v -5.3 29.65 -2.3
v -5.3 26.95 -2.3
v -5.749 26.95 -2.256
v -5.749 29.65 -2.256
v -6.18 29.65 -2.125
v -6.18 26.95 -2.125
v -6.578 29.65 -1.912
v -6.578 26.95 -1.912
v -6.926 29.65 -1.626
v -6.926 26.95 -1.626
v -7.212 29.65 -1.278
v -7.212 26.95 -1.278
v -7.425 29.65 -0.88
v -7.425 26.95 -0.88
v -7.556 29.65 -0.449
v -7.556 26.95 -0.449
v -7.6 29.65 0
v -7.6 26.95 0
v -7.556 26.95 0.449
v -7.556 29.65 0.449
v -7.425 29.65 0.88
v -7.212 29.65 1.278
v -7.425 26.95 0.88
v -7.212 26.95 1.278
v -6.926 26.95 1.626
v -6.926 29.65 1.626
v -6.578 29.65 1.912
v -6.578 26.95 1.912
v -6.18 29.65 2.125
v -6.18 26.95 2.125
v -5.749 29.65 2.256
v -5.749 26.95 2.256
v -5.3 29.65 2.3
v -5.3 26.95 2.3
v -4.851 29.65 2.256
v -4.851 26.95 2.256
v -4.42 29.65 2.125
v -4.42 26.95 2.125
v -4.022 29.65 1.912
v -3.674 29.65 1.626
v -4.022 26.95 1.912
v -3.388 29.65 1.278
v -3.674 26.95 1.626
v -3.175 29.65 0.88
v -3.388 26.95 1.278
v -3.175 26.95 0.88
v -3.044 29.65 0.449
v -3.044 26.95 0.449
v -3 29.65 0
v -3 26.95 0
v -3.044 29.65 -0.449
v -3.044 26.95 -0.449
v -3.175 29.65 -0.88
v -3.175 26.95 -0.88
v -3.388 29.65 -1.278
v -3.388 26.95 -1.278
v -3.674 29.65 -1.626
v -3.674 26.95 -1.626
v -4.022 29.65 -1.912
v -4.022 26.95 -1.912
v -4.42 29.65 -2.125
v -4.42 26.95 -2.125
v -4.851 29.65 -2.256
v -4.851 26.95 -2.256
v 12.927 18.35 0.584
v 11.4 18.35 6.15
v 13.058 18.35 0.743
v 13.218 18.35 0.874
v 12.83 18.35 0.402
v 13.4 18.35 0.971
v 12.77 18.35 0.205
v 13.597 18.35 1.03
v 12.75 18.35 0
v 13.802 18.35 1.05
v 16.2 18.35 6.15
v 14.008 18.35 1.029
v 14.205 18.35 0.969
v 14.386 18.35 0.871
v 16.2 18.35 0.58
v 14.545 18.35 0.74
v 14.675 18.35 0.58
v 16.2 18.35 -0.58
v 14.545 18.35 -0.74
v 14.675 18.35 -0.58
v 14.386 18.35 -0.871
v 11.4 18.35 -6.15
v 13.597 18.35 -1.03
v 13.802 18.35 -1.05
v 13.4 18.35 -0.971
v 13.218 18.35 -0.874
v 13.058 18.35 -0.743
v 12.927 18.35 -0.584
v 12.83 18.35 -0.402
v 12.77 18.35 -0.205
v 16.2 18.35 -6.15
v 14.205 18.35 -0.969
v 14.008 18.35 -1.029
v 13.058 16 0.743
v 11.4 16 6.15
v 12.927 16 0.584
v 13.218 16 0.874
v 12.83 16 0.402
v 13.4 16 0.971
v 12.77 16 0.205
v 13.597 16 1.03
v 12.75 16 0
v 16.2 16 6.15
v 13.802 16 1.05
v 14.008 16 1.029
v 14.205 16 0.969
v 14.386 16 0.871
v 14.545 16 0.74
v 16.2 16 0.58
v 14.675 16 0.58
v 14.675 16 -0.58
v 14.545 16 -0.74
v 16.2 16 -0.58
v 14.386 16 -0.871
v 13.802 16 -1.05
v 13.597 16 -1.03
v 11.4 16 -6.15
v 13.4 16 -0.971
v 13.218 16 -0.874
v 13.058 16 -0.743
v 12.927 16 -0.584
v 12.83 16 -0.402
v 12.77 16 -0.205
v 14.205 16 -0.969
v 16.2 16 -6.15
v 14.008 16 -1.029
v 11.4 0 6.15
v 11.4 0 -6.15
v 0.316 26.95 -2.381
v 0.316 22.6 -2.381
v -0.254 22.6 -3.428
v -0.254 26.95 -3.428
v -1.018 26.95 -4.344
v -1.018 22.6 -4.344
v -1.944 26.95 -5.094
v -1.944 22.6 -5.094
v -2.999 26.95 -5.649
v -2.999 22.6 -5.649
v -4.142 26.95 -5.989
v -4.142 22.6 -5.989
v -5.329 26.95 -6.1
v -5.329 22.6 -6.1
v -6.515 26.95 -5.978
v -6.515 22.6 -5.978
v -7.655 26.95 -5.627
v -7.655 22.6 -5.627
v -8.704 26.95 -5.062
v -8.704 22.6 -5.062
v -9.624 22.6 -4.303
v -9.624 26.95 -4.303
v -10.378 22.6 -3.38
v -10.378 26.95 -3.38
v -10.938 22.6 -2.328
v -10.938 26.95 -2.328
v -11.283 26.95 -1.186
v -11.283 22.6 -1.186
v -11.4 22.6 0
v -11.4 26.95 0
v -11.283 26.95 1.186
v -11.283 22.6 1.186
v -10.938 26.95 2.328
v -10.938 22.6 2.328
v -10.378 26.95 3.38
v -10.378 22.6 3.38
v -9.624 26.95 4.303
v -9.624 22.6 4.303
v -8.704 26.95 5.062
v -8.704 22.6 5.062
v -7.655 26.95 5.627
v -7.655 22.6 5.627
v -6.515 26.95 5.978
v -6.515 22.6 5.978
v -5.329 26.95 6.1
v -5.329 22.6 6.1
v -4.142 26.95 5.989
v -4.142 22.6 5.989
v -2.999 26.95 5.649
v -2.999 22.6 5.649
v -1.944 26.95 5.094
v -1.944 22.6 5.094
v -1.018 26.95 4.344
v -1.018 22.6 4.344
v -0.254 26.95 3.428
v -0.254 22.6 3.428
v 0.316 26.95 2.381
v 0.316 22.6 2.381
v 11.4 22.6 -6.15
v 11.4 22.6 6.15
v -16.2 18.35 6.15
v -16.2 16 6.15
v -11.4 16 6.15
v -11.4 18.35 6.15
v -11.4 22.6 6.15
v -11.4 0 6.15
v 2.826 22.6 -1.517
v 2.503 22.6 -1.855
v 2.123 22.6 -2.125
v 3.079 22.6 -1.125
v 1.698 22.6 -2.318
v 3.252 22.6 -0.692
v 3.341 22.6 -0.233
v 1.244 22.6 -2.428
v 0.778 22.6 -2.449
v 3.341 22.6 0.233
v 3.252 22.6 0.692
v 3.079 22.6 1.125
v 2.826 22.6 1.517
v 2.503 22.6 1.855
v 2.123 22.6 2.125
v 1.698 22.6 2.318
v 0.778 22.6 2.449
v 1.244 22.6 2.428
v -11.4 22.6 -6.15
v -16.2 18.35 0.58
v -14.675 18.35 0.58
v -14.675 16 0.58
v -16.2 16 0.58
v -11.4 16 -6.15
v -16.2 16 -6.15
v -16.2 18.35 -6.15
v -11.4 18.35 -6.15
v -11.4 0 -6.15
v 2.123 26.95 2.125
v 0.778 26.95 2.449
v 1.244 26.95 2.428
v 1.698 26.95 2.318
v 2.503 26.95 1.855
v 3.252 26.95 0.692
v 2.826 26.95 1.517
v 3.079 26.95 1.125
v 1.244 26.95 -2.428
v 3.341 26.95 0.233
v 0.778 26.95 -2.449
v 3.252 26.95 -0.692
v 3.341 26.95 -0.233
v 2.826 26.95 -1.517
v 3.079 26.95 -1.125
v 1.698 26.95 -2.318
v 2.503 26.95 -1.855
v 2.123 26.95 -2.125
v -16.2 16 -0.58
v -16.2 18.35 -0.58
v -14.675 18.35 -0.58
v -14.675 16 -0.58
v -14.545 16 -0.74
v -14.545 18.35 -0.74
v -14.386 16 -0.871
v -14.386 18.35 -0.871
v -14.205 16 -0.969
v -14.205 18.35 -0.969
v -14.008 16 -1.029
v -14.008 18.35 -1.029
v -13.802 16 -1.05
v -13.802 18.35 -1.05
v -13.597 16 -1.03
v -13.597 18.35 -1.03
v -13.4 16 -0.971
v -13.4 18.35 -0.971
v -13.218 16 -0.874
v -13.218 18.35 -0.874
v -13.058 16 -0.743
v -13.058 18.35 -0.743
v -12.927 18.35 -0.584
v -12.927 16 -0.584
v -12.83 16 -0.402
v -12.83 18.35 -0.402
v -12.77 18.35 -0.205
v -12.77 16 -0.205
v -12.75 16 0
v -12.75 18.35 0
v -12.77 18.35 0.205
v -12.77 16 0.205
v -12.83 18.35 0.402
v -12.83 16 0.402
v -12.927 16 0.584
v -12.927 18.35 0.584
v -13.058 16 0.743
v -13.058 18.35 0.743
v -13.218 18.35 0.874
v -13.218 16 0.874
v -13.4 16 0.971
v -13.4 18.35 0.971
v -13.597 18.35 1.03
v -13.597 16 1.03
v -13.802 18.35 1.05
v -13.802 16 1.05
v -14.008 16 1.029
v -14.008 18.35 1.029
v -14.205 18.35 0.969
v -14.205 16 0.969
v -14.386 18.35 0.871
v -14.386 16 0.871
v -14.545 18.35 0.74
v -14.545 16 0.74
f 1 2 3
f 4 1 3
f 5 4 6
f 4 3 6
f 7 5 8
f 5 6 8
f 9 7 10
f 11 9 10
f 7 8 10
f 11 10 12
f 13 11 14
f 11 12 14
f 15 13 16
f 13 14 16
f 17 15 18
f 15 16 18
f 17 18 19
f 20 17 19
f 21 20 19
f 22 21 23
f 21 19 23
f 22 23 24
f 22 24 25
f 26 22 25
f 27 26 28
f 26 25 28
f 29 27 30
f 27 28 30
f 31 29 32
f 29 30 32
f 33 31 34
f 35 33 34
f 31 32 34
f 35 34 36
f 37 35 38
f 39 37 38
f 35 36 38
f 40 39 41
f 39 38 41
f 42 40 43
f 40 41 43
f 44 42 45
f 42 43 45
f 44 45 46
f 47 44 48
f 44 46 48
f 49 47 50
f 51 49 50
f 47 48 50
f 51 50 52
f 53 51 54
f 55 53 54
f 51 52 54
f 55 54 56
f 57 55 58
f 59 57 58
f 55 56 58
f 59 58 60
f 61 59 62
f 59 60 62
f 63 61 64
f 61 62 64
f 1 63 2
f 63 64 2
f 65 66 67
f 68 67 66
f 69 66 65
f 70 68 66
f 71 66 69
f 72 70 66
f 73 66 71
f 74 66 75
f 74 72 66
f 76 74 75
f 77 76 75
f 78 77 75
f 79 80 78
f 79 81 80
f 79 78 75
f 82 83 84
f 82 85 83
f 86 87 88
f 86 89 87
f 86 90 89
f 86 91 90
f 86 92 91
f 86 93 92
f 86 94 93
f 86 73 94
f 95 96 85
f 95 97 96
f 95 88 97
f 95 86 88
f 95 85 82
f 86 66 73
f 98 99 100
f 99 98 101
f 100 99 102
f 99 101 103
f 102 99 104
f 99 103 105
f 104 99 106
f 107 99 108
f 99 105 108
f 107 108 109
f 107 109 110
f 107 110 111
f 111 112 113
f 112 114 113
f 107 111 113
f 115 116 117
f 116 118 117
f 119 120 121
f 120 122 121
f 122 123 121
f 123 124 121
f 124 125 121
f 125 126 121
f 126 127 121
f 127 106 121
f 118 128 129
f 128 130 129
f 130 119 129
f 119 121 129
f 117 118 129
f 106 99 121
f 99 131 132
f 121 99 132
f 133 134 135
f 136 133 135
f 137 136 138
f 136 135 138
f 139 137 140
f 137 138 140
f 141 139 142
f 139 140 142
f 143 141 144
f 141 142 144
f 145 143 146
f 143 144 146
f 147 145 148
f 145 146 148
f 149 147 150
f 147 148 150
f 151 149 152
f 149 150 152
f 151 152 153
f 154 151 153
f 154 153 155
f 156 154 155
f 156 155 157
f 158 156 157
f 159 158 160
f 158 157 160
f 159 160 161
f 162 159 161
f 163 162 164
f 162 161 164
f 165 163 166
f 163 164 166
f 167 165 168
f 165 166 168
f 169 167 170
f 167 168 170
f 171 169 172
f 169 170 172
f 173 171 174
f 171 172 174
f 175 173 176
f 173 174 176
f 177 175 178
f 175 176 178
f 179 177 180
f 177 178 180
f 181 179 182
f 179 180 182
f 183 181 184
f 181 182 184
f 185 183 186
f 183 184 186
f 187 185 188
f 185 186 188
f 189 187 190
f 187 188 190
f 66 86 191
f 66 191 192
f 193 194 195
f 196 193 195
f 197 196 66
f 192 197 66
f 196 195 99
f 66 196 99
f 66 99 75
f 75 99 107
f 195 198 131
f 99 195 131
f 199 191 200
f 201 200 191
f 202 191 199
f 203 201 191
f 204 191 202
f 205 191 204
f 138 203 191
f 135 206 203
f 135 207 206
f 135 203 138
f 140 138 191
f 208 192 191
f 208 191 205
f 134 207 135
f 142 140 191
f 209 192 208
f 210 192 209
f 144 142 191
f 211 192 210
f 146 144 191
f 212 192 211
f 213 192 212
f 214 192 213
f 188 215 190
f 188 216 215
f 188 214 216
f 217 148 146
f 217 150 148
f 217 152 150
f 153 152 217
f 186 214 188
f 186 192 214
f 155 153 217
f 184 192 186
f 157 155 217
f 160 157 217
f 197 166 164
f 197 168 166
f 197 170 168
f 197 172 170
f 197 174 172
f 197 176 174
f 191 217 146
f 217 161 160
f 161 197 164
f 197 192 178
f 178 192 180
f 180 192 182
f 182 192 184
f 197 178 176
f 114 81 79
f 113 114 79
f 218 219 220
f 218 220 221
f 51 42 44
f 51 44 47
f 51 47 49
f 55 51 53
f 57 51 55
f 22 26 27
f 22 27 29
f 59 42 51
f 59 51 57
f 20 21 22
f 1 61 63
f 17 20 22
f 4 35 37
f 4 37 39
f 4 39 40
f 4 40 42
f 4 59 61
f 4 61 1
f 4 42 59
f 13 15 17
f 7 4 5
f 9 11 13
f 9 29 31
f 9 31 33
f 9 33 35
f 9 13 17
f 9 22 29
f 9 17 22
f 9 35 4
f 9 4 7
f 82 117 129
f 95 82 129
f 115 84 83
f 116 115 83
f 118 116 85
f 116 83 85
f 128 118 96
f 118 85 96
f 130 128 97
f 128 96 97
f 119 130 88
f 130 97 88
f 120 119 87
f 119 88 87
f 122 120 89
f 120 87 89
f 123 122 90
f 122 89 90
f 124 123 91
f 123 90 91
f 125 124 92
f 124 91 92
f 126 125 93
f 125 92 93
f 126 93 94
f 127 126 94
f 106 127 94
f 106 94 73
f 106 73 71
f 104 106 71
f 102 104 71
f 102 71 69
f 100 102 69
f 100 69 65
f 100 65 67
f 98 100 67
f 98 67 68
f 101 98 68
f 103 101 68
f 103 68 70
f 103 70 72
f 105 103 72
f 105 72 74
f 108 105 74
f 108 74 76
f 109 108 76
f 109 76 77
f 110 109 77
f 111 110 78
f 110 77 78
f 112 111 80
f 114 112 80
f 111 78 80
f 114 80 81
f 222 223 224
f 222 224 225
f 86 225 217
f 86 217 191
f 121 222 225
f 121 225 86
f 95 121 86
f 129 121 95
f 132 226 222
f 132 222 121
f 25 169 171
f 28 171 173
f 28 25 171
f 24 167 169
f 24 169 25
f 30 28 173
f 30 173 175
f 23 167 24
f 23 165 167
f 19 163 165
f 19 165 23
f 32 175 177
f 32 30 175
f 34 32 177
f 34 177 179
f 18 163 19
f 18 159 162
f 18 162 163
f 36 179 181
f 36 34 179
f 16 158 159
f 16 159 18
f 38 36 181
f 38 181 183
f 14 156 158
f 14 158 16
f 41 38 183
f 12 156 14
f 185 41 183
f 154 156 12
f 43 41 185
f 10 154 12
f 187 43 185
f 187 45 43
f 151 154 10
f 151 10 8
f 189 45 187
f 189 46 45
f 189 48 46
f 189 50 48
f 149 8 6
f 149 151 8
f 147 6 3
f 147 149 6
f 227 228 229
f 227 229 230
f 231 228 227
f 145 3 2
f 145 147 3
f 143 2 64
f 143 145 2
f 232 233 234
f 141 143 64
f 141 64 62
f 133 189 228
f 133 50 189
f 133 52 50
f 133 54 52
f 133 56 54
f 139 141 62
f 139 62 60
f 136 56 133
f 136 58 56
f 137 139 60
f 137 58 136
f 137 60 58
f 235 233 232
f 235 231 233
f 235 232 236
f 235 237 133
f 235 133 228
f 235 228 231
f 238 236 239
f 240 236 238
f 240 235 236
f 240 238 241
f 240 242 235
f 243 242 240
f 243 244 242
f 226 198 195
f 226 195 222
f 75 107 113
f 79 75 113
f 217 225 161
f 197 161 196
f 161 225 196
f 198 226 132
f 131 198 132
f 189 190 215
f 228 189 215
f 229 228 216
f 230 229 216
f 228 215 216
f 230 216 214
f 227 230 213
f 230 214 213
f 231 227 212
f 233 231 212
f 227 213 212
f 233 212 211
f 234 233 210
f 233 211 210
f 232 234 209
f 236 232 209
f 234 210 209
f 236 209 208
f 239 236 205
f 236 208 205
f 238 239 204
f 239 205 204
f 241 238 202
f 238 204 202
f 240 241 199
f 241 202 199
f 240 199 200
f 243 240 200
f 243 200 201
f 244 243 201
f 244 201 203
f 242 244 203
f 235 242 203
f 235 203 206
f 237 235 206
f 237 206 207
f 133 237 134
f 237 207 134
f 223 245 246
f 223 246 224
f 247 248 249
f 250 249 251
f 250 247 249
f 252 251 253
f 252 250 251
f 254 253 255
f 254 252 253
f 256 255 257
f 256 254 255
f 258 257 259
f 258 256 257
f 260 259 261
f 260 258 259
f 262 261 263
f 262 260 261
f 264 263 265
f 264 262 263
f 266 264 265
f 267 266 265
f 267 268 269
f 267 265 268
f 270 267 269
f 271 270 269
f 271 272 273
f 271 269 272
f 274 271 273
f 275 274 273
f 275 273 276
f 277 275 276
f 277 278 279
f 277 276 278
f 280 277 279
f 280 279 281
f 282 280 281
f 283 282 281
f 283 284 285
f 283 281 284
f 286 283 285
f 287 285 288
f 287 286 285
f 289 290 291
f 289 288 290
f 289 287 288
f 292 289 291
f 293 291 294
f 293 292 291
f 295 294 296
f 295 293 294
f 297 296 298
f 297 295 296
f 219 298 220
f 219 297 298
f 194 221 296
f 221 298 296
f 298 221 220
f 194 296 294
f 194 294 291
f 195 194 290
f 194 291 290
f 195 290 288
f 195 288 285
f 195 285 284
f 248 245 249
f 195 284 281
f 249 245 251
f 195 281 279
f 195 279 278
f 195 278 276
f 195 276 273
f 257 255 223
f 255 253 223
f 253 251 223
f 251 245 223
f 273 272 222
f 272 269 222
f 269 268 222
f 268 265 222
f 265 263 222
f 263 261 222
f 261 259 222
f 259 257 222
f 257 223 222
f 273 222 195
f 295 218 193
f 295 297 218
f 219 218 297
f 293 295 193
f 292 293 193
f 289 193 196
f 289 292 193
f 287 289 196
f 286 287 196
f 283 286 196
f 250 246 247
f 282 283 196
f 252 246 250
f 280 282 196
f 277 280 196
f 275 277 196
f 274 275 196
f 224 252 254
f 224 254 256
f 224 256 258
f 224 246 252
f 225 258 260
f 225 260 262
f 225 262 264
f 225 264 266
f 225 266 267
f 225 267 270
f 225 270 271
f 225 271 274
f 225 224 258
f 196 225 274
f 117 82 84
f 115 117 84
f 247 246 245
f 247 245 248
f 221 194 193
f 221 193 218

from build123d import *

# Parameters (mm, degrees)
ESBO_O1_W                = 22.8
ESBO_O1_H                = 12.3
RESSALTO_EXTRUS_O1_DEPTH = 16
ESBO_O2_W                = 32.4
ESBO_O2_H                = 12.3
RESSALTO_EXTRUS_O2_DEPTH = 2.35
ESBO_O3_W                = 22.8
ESBO_O3_H                = 12.3
RESSALTO_EXTRUS_O3_DEPTH = 4.25
CORTE_EXTRUS_O1_DEPTH    = 4.25
RESSALTO_EXTRUS_O4_DEPTH = 4.35
ESBO_O6_R                = 2.3
RESSALTO_EXTRUS_O5_DEPTH = 2.7


with BuildPart() as part:
    # Esboço1 → Ressalto-extrusão1 (new body)
    with BuildSketch(Plane(origin=(0, 0, 0), x_dir=(1, 0, 0), z_dir=(0, 1, 0))):
        Rectangle(ESBO_O1_W, ESBO_O1_H)
    extrude(amount=RESSALTO_EXTRUS_O1_DEPTH)

    # Esboço2 → Ressalto-extrusão2 (add)
    with BuildSketch(Plane(origin=(0, 16, 0), x_dir=(1, 0, 0), z_dir=(0, 1, 0))):
        Rectangle(ESBO_O2_W, ESBO_O2_H)
    extrude(amount=RESSALTO_EXTRUS_O2_DEPTH)

    # Esboço3 → Ressalto-extrusão3 (add)
    with BuildSketch(Plane(origin=(0, 18.35, 0), x_dir=(-1, 0, 0), z_dir=(0, 1, 0))):
        Rectangle(ESBO_O3_W, ESBO_O3_H)
    extrude(amount=RESSALTO_EXTRUS_O3_DEPTH)

    # Esboço4 → Corte-extrusão1 (cut)
    with BuildSketch(Plane(origin=(0, 18.35, 0), x_dir=(1, 0, 0), z_dir=(0, 1, 0))):
        with BuildLine():
            Line((16.2, 0), (16.2, 0.58))
            Line((16.2, 0.58), (14.675271386, 0.58))
            ThreePointArc((14.675271386, 0.58), (12.75, 0), (14.675271386, -0.58))
            Line((14.675271386, -0.58), (16.2, -0.58))
            Line((16.2, -0.58), (16.2, 0))
        make_face()
        with BuildLine():
            Line((-16.2, 0.58), (-14.675271386, 0.58))
            ThreePointArc((-14.675271386, 0.58), (-12.75, 0), (-14.675271386, -0.58))
            Line((-14.675271386, -0.58), (-16.2, -0.58))
            Line((-16.2, -0.58), (-16.2, 0))
            Line((-16.2, 0), (-16.2, 0.58))
        make_face()
    extrude(amount=-CORTE_EXTRUS_O1_DEPTH, mode=Mode.SUBTRACT)

    # Esboço5 → Ressalto-extrusão4 (add)
    with BuildSketch(Plane(origin=(0, 22.6, 0), x_dir=(1, 0, 0), z_dir=(0, 1, 0))):
        with BuildLine():
            ThreePointArc((0.315959416, 2.381386118), (-11.4, 0), (0.315959416, -2.381386118))
            ThreePointArc((0.315959416, -2.381386118), (3.351959063, 0), (0.315959416, 2.381386118))
        make_face()
    extrude(amount=RESSALTO_EXTRUS_O4_DEPTH)

    # Esboço6 → Ressalto-extrusão5 (add)
    with BuildSketch(Plane(origin=(0, 26.95, 0), x_dir=(1, 0, 0), z_dir=(0, 1, 0))):
        with Locations(Location((-5.3, 0, 0), (0, 0, 90))):
            Circle(ESBO_O6_R)
    extrude(amount=RESSALTO_EXTRUS_O5_DEPTH)


solid = part.part
